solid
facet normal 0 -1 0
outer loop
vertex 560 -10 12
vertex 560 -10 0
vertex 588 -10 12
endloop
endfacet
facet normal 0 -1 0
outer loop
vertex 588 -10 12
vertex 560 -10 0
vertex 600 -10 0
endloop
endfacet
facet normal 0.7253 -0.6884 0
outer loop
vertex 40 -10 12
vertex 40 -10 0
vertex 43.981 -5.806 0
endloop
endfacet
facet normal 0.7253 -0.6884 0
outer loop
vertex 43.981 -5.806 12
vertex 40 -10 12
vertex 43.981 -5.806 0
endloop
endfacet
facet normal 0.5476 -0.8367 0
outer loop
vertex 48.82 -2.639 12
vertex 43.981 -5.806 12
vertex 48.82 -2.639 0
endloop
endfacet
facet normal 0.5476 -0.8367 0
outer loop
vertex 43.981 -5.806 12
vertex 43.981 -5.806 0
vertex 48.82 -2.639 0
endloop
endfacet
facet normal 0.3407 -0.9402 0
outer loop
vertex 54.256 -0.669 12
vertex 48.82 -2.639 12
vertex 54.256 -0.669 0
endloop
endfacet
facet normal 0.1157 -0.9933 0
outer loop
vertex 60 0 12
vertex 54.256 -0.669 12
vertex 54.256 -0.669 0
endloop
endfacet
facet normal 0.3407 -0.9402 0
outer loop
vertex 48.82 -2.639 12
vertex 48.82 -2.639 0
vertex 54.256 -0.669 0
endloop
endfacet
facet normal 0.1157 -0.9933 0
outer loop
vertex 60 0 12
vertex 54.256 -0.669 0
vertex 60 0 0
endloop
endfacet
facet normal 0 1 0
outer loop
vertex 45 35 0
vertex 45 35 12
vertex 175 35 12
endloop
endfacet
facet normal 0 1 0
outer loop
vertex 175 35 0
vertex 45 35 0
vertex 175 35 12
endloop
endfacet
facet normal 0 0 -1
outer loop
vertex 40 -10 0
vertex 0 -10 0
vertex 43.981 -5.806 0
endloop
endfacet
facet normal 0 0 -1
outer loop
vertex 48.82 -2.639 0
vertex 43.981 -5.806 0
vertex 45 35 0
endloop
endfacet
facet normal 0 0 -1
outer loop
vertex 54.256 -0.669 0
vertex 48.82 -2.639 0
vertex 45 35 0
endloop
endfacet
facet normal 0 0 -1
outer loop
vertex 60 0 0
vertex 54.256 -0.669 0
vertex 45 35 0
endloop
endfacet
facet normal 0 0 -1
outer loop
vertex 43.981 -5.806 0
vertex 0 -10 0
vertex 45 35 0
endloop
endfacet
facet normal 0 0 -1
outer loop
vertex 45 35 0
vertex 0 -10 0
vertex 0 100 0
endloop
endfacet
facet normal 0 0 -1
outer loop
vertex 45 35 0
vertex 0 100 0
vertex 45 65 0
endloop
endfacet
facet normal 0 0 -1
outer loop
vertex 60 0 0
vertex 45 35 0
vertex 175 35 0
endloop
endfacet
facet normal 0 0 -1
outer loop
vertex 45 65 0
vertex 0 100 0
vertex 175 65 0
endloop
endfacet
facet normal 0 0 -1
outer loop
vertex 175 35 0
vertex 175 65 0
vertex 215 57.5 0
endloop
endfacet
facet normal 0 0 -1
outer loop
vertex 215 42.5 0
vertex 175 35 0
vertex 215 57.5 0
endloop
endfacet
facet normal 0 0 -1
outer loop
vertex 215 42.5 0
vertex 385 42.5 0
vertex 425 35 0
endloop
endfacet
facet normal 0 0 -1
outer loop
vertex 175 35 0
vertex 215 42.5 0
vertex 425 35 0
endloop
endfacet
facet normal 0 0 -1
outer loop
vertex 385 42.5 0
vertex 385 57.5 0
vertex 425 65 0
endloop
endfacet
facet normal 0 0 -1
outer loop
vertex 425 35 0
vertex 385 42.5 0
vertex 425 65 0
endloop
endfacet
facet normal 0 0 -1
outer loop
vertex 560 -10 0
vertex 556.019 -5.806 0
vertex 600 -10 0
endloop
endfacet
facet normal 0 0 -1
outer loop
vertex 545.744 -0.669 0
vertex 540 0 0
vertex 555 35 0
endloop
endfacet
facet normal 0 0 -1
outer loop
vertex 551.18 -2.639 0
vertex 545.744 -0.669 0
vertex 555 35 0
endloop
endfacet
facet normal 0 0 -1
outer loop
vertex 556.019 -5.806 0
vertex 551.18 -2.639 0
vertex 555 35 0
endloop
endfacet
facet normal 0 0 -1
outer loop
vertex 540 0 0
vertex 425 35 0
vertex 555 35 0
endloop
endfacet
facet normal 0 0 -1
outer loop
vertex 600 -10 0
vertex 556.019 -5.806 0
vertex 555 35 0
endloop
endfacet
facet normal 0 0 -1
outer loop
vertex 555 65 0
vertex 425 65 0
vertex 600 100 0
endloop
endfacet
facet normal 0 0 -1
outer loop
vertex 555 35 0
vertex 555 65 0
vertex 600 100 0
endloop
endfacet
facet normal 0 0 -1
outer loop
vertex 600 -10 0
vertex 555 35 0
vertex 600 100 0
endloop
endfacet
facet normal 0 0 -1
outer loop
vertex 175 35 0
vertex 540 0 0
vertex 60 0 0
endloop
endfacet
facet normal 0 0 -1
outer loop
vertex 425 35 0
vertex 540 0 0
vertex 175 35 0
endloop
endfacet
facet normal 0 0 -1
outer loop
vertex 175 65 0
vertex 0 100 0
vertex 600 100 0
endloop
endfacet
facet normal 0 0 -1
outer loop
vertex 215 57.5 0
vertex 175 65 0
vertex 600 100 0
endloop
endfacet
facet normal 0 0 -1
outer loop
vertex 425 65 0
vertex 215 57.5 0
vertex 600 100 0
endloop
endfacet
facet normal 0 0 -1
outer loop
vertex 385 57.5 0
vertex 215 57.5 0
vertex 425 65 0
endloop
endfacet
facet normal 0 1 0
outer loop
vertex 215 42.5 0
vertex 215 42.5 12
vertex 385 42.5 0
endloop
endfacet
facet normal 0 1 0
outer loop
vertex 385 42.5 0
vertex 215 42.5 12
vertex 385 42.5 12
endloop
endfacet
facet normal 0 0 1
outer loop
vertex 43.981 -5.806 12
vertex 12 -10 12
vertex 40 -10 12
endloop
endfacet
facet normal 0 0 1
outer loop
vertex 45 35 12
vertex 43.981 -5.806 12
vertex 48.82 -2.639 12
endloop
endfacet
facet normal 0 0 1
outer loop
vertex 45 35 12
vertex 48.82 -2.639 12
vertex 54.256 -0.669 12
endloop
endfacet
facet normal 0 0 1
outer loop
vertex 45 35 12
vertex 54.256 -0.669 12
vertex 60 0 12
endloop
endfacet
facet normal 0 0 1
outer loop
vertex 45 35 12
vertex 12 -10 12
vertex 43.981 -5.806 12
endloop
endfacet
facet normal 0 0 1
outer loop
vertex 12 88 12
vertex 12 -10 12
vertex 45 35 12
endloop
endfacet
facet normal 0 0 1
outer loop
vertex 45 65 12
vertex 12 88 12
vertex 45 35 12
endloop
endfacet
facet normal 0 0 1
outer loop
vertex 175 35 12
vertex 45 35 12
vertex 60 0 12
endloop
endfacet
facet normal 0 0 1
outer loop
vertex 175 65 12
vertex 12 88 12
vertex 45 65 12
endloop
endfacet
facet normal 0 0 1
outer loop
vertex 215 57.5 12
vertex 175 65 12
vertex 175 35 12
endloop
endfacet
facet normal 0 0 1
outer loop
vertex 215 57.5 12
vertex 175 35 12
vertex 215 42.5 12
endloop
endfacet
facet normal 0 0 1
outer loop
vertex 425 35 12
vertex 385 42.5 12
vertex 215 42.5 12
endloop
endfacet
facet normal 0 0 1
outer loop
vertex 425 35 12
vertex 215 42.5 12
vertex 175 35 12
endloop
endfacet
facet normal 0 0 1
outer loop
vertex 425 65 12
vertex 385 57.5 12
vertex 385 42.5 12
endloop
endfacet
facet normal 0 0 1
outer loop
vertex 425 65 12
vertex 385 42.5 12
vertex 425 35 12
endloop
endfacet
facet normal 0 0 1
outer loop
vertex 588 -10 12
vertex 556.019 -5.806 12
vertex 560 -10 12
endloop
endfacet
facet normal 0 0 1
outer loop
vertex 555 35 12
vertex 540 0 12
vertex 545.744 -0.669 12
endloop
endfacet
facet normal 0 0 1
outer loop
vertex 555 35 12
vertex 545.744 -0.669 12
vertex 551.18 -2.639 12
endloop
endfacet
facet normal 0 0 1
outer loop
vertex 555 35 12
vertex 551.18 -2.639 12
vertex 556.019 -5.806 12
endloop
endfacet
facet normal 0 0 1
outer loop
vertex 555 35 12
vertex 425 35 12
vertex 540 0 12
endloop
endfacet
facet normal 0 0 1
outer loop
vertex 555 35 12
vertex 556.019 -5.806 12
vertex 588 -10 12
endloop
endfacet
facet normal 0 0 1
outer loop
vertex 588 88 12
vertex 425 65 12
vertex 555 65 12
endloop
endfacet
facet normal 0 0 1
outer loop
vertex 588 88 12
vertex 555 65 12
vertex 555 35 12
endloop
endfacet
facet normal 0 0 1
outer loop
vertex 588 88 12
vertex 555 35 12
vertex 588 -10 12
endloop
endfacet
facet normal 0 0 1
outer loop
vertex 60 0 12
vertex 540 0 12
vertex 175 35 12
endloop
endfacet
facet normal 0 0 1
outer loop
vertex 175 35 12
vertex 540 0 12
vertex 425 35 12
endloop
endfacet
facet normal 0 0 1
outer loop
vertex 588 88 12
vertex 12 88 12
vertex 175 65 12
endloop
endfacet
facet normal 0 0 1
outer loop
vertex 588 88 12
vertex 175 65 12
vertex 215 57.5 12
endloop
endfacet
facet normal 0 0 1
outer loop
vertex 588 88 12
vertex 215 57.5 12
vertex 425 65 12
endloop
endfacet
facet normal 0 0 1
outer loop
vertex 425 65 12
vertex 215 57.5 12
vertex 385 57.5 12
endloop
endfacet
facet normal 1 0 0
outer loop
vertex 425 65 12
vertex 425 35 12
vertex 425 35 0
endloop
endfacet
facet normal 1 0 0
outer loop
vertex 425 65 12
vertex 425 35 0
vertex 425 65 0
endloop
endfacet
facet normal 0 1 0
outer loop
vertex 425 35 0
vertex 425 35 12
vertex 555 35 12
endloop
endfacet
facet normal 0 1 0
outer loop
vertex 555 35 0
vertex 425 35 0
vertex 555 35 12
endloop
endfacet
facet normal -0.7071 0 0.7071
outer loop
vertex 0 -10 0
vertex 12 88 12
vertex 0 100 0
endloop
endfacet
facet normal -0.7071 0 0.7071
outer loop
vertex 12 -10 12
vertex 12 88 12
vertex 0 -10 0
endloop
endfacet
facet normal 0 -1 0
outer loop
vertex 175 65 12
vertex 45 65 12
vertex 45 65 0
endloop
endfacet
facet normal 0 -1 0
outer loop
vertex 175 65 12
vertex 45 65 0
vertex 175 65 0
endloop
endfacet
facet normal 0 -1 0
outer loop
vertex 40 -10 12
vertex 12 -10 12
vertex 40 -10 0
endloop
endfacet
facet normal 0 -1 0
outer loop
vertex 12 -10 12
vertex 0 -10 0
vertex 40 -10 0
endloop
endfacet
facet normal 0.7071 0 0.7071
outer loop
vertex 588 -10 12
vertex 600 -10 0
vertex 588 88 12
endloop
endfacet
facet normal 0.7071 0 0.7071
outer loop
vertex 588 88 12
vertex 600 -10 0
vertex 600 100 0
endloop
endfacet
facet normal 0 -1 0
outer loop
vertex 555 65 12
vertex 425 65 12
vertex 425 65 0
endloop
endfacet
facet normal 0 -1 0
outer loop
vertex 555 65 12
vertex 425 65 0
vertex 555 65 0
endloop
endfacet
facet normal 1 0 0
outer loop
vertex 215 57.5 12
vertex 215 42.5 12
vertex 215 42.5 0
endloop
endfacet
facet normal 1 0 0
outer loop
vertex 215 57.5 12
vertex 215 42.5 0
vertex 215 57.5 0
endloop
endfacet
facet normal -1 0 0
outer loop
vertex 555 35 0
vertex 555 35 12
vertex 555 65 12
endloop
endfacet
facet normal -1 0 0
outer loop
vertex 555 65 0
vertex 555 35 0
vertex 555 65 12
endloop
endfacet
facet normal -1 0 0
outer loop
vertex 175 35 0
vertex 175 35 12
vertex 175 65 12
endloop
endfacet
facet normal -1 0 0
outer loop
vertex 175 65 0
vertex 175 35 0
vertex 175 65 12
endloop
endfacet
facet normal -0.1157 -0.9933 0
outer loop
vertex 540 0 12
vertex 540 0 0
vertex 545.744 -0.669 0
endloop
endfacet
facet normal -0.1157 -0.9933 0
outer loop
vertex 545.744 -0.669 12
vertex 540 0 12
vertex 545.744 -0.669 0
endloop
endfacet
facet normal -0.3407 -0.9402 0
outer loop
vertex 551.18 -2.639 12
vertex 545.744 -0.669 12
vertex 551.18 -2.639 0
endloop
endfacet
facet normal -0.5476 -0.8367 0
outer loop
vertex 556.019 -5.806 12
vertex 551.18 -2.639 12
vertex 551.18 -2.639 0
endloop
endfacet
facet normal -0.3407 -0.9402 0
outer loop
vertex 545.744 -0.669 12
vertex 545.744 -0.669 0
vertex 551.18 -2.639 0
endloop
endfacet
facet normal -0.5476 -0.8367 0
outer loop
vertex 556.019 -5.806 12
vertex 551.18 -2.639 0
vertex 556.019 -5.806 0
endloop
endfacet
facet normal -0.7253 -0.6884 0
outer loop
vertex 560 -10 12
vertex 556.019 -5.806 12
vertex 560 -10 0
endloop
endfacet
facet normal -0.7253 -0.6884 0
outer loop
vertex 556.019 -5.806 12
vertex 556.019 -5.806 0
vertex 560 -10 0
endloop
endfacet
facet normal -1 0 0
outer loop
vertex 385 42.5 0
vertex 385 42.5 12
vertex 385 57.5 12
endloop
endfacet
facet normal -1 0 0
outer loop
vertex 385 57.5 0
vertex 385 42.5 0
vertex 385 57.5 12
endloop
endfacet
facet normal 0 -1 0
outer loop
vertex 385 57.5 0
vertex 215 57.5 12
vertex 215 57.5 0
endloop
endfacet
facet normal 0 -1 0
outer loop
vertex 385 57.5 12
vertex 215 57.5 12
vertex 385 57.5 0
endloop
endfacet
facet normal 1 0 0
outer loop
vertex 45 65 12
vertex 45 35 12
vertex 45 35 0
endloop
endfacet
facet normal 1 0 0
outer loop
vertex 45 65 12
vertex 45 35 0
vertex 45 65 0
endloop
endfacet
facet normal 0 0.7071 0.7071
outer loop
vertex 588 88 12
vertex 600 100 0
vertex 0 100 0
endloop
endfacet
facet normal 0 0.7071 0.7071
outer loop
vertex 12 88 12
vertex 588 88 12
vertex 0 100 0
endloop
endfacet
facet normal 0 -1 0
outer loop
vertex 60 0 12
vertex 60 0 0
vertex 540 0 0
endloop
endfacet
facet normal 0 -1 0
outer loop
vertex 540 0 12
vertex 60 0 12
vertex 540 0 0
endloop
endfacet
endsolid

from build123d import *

# Parameters (mm, degrees)
BOSS_EXTRUDE1_DEPTH = 12
SKETCH2_W           = 130
SKETCH2_H           = 30
SKETCH2_W_2         = 170
SKETCH2_H_2         = 15
CUT_EXTRUDE1_DEPTH  = 609.394608786
CHAMFER1_SIZE       = 12


with BuildPart() as part:
    # Sketch1 → Boss-Extrude1 (new body)
    with BuildSketch(Plane.XY):
        with BuildLine():
            Line((0, 0), (0, -10))
            Line((0, -10), (40, -10))
            ThreePointArc((40, -10), (48.819660113, -2.639320225), (60, 0))
            Line((60, 0), (540, 0))
            ThreePointArc((540, 0), (551.180339887, -2.639320225), (560, -10))
            Line((560, -10), (600, -10))
            Line((600, -10), (600, 0))
            Line((600, 0), (600, 100))
            Line((600, 100), (0, 100))
            Line((0, 100), (0, 0))
        make_face()
    extrude(amount=BOSS_EXTRUDE1_DEPTH)

    # Sketch2 → Cut-Extrude1 (cut, through all)
    with BuildSketch(Plane.XY.offset(12)):
        with Locations((110, 50)):
            Rectangle(SKETCH2_W, SKETCH2_H)
        with Locations((300, 50)):
            Rectangle(SKETCH2_W_2, SKETCH2_H_2)
        with Locations((490, 50)):
            Rectangle(SKETCH2_W, SKETCH2_H)
    extrude(amount=-CUT_EXTRUDE1_DEPTH, mode=Mode.SUBTRACT)

    # Chamfer1
    chamfer1_edges = [part.edges().sort_by_distance(p)[0] for p in [
        (600, 45, 12),
        (300, 100, 12),
        (0, 45, 12),
    ]]
    chamfer(chamfer1_edges, length=CHAMFER1_SIZE - 0.0001)  # a hair under: the kernel refuses the full size


solid = part.part
